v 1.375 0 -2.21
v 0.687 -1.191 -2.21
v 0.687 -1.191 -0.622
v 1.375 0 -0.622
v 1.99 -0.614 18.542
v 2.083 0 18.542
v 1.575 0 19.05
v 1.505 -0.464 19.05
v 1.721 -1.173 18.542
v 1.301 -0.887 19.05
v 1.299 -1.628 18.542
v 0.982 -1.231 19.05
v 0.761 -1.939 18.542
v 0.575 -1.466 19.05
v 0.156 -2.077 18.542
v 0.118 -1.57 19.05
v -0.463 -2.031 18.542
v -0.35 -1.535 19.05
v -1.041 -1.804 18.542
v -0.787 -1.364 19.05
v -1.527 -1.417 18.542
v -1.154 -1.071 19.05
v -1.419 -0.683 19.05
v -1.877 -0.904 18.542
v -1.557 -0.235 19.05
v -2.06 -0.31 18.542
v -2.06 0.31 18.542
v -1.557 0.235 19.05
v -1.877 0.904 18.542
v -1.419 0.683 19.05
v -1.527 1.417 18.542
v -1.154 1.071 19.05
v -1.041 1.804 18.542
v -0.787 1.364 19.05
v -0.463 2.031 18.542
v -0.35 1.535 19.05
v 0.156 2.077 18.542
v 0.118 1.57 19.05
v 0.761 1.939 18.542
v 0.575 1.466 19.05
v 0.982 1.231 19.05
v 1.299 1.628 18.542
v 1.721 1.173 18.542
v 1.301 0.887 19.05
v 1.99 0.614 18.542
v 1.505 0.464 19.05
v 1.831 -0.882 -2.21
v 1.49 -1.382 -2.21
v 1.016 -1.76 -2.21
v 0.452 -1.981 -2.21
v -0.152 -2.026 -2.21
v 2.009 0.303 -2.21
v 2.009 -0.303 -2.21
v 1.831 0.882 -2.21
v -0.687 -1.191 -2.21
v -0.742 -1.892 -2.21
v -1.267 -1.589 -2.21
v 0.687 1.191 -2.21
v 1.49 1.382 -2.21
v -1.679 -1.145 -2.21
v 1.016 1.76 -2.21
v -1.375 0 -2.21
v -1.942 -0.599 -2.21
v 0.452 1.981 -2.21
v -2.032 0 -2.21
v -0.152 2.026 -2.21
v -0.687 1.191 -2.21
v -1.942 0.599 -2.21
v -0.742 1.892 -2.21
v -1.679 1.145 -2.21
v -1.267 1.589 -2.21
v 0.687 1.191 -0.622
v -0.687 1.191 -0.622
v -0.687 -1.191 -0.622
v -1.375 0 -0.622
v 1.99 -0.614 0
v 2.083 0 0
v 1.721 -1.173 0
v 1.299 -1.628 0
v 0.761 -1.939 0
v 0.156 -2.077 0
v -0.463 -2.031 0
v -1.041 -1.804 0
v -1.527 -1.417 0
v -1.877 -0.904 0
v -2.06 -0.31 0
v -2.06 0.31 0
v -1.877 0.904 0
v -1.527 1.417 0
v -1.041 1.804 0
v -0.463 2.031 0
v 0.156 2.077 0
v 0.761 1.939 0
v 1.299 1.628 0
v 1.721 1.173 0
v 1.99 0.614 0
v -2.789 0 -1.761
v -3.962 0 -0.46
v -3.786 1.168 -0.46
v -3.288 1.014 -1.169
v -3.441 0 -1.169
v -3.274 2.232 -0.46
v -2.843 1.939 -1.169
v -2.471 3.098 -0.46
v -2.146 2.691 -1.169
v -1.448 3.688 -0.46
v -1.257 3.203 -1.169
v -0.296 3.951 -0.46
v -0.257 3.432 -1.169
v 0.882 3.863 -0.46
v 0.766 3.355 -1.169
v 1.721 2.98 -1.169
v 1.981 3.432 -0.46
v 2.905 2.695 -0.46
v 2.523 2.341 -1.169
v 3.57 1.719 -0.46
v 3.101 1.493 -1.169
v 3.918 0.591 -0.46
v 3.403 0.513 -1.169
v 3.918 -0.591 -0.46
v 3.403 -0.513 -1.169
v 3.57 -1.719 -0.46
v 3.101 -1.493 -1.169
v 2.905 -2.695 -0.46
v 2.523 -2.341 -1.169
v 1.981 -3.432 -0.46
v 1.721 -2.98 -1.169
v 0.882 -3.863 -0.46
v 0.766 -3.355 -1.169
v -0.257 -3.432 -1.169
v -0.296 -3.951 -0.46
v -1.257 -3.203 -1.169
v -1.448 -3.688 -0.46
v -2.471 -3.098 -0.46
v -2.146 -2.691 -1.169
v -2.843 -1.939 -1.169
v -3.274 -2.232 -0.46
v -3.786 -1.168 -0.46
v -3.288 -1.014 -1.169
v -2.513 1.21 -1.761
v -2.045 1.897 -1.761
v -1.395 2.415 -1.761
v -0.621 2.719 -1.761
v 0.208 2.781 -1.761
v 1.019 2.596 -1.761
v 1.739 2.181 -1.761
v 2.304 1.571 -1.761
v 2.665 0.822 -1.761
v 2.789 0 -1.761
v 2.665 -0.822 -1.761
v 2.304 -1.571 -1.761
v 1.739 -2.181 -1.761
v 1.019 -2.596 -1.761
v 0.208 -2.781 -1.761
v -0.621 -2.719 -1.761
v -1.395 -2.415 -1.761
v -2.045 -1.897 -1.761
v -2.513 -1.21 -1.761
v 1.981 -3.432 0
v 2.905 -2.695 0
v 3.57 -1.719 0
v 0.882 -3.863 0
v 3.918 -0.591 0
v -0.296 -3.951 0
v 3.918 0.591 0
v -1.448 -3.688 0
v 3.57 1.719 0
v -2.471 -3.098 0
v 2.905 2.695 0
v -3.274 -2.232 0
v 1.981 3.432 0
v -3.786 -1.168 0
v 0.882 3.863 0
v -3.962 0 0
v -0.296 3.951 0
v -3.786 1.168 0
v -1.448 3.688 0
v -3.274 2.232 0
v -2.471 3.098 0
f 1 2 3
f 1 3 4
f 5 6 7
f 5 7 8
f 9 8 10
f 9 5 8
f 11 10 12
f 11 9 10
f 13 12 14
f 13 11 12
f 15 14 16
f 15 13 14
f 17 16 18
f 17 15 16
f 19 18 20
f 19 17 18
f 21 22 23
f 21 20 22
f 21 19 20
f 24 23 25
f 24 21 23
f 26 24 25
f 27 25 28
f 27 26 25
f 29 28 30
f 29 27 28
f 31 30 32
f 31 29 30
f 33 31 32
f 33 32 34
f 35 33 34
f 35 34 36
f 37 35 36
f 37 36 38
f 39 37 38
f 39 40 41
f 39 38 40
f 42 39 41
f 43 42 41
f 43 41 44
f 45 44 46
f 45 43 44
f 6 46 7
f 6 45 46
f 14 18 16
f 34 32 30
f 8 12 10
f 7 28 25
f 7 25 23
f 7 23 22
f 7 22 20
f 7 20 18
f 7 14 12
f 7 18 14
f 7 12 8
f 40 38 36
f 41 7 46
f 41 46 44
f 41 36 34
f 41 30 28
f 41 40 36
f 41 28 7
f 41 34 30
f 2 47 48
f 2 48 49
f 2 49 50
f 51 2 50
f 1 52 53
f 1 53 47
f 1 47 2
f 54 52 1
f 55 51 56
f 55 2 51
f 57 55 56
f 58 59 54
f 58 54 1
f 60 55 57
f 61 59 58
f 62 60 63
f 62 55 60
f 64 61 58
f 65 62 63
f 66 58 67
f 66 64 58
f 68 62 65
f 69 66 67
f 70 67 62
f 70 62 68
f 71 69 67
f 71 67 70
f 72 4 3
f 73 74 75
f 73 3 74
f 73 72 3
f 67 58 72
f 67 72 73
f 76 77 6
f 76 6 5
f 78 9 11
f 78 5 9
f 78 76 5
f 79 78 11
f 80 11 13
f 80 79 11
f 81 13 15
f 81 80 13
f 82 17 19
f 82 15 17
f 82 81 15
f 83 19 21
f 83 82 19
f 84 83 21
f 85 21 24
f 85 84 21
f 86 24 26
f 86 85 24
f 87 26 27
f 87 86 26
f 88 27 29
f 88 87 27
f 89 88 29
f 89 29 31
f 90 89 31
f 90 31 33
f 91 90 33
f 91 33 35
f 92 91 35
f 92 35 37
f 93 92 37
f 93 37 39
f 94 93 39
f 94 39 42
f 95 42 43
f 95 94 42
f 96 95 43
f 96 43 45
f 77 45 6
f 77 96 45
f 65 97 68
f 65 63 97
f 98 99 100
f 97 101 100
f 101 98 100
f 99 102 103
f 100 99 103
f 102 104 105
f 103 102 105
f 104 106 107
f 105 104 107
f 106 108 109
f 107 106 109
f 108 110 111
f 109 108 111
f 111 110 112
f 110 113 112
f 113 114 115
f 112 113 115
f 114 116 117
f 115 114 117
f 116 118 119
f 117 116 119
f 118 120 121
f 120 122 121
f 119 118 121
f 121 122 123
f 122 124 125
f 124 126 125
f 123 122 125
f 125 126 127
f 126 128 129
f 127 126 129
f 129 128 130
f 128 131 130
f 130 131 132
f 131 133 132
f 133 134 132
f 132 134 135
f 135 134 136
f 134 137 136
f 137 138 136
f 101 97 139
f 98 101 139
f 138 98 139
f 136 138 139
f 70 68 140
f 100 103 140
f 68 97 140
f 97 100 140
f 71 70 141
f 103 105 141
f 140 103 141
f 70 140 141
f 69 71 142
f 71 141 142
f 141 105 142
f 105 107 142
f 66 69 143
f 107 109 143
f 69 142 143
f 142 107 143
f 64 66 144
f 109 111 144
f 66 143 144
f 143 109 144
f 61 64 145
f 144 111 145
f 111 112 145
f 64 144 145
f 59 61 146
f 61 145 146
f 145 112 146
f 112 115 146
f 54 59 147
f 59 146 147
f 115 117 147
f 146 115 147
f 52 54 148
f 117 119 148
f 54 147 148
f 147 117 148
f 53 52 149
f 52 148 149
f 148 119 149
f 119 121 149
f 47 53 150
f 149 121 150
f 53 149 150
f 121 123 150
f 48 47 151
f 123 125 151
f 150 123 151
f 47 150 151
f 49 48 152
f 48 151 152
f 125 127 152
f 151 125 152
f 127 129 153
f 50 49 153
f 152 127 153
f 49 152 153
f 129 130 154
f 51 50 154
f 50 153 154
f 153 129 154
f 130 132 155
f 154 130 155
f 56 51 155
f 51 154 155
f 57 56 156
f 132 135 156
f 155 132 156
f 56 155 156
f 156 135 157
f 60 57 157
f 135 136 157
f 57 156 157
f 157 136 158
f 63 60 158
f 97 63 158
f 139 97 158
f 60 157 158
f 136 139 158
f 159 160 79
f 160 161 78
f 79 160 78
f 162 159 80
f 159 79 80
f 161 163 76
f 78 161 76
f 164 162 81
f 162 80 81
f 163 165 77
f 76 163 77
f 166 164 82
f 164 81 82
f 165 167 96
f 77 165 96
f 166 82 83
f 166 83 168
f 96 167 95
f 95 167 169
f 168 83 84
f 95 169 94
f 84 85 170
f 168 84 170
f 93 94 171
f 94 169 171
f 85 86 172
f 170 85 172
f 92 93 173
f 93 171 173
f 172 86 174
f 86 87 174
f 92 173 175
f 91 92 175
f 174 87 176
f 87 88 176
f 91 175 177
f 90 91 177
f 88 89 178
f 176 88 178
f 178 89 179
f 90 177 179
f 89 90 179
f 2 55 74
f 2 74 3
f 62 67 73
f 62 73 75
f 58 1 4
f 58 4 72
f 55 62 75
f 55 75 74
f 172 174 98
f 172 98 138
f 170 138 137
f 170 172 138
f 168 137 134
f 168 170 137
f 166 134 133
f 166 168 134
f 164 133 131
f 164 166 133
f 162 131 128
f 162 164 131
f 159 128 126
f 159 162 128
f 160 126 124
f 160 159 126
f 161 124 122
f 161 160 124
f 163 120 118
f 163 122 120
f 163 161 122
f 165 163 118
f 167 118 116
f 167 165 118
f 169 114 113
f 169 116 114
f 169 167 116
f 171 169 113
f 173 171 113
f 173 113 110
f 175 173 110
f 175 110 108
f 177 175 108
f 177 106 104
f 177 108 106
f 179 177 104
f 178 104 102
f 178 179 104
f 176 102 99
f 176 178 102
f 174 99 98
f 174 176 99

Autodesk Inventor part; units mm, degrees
ref_plane "YZ Plane" through (0, 0, 0) normal (1, 0, 0) x (0, 1, 0)
ref_plane "XZ Plane" through (0, 0, 0) normal (0, 1, 0) x (-1, 0, 0)
ref_plane "XY Plane" through (0, 0, 0) normal (0, 0, 1) x (1, 0, 0)
sketch "Sketch1" plane through (0, 0, 0) normal (0, 0, 1) x (1, 0, 0)
  circle A0 centre (0, 0) radius 2.0828
  dimension "d0" = 4.1656
extrude "Extrusion1" add sketch "Sketch1" along normal blind 19.05
sketch "Sketch2" plane through (0, 0, 0) normal (0, 1, 0) x (-1, 0, 0)
  line L0 (0, 0) -> (0, -2.2098)
  line L1 (0, 0) -> (3.9624, 0)
  line L2 (0, -2.2098) -> (2.032, -2.2098)
  line L3 (3.9624, 0) -> (3.9624, 3.6562) construction
  arc A0 (2.032, -2.2098) -> (3.9624, -0.4599) centre (0.1837, 1.7689) ccw
  line L4 (4.5847, 0.6553) -> (4.5847, -0.2608) construction
  line L5 (3.9624, -0.4599) -> (3.9624, 0)
  dimension "d3" = 2.2098
  dimension "d6" = 2.032
  dimension "d19" = 3.9624
revolve "Revolution1" add sketch "Sketch2" angle 360 about axis through (0, 0, 0) along (0, 0, -1)
sketch "Sketch3" plane through (0, 0, -2.2098) normal (0, 0, -1) x (-1, 0, 0)
  circle A0 centre (0, 0) radius 2.032 projected
  line L0 (-0.6874, 1.1906) -> (0.6874, 1.1906)
  line L1 (0.6874, 1.1906) -> (1.3748, 0)
  line L2 (1.3748, 0) -> (0.6874, -1.1906)
  line L3 (0.6874, -1.1906) -> (-0.6874, -1.1906)
  line L4 (-0.6874, -1.1906) -> (-1.3748, 0)
  line L5 (-1.3748, 0) -> (-0.6874, 1.1906)
  dimension "d8" = 2.3813
extrude "Extrusion2" cut sketch "Sketch3" against normal blind 1.5875 contours L0 L1 L2 L3 L4 L5
chamfer "Chamfer1" distance 0.508 angle 45 1 edges at (-2.0828, 0, 19.05)
thread "Thread1" size "8-32 UNC" class "2A" standard "ANSI Unified Screw Threads" full length
properties part number "8-32 BHCS x750" material "Steel"
